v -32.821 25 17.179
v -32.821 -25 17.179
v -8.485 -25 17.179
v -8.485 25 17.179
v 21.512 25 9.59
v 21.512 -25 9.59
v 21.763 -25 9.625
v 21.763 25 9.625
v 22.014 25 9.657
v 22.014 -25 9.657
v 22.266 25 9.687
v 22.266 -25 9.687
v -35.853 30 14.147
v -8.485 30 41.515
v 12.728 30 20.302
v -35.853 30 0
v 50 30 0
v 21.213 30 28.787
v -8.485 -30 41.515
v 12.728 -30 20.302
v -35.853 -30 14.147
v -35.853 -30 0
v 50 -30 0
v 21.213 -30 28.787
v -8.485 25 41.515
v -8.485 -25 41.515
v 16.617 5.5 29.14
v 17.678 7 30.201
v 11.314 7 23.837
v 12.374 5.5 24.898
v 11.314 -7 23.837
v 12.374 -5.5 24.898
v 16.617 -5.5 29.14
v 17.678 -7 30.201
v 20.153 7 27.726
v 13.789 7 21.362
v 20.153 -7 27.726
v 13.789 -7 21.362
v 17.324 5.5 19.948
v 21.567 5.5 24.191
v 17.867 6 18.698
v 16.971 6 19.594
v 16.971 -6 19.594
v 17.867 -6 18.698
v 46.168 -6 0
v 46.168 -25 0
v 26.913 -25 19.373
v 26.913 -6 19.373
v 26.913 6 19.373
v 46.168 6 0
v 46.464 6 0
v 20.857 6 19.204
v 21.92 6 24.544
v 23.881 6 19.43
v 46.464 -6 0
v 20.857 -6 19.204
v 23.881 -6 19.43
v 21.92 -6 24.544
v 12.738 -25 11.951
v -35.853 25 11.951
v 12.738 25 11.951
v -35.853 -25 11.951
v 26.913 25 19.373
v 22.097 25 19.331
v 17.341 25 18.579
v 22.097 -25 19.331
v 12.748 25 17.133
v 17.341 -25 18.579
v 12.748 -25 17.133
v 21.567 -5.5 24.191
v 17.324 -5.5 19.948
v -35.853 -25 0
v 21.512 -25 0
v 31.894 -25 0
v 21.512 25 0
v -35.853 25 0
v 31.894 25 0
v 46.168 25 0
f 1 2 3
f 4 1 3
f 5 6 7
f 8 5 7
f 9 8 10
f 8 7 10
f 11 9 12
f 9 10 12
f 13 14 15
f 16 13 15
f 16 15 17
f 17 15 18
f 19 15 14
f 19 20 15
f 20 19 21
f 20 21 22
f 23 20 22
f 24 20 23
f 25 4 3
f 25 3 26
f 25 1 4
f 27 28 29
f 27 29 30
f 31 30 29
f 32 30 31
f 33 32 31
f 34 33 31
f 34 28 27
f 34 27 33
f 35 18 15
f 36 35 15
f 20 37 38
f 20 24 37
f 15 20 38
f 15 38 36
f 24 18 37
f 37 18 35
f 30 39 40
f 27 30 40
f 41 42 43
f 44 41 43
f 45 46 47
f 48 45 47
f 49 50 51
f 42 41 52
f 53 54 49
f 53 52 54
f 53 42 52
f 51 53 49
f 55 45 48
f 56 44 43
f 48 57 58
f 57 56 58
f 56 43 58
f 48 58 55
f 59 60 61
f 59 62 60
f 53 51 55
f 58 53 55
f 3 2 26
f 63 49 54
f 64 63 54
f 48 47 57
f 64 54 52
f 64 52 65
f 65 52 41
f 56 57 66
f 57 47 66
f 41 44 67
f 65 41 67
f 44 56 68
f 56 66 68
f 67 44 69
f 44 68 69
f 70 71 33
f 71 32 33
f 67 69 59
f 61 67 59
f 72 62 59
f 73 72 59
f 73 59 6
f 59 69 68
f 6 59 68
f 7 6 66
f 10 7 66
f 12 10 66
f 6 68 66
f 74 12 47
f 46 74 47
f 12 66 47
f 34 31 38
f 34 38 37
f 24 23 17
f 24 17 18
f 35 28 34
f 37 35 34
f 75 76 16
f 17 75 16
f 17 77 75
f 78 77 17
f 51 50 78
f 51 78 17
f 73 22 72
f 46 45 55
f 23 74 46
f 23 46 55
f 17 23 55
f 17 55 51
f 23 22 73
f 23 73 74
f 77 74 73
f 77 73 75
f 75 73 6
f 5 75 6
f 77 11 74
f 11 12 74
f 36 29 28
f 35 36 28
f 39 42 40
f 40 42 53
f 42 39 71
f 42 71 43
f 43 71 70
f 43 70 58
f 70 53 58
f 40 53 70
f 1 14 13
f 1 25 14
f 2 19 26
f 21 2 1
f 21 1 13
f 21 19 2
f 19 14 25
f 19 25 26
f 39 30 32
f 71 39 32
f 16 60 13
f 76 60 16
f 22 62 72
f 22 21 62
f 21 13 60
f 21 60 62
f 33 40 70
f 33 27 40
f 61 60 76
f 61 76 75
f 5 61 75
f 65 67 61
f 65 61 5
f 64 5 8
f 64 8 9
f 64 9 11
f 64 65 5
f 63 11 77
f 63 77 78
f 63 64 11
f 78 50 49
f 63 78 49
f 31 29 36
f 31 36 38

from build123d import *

# Parameters (mm, degrees)
F1_DEPTH  = 30
F2_W      = 12
F2_H      = 7
F3_DEPTH  = 38.2116781187
F5_DEPTH  = 25
F6_W      = 60.886583291
F6_H      = 11.9508793578
F7_DEPTH  = 25
F8_W      = 14
F8_H      = 9
F8_W_2    = 11
F8_H_2    = 6
F9_DEPTH  = 3.5
F10_W     = 41.5411135182
F10_H     = 24.3398016319
F11_DEPTH = 25


with BuildPart() as f1:
    # F0 (on Front) → F1 (new body, symmetric)
    with BuildSketch(Plane.XZ):
        Polygon((-8.4852813742, 41.5147186258), (-35.8526408672, 14.1473591328), (-35.8526408672, 0), (50, 0), (21.2132034356, 28.7867965644), (12.7279220614, 20.3015151902), align=None)
    extrude(amount=F1_DEPTH, both=True)

    # F2 (on face) → F3 (cut, through all)
    with BuildSketch(Plane(origin=(-3.7867965644, 0, 3.7867965644), x_dir=(0, -1, 0), z_dir=(-0.7071067812, 0, 0.7071067812))):
        with Locations((0, 29.3553390593)):
            Rectangle(F2_W, F2_H)
    extrude(amount=-F3_DEPTH, mode=Mode.SUBTRACT)

    # F4 (on Front) → F5 (cut, symmetric)
    with BuildSketch(Plane.XZ):
        with BuildLine():
            Line((31.8941702423, 0), (46.1681298912, 0))
            Line((46.1681298912, 0), (26.9125392085, 19.3730033934))
            ThreePointArc((26.9125392085, 19.3730033934), (19.7053909545, 19.0432368727), (12.7481166376, 17.1332457749))
            Line((12.7481166376, 17.1332457749), (12.7279220614, 6.3964259197))
            ThreePointArc((12.7279220614, 6.3964259197), (17.3138400367, 8.572904137), (22.2663749009, 9.6865016967))
            Line((22.2663749009, 9.6865016967), (31.8941702423, 0))
        make_face()
    extrude(amount=F5_DEPTH, both=True, mode=Mode.SUBTRACT)

    # F6 (on Front) → F7 (cut, symmetric)
    with BuildSketch(Plane.XZ):
        with Locations((-8.9317080565, 5.9754396789)):
            Rectangle(F6_W, F6_H)
    extrude(amount=F7_DEPTH, both=True, mode=Mode.SUBTRACT)

    # F8 (on face) → F9 (join, symmetric)
    with BuildSketch(Plane(origin=(-3.7867965644, 0, 3.7867965644), x_dir=(0, -1, 0), z_dir=(-0.7071067812, 0, 0.7071067812))):
        with Locations((0, 29.3553390593)):
            Rectangle(F8_W, F8_H)
        with Locations((0, 29.3553390593)):
            Rectangle(F8_W_2, F8_H_2, mode=Mode.SUBTRACT)
    extrude(amount=F9_DEPTH, both=True)

    # F10 (on Front) → F11 (cut, symmetric)
    with BuildSketch(Plane.XZ):
        with Locations((-29.2559308, 29.3487575836)):
            Rectangle(F10_W, F10_H)
    extrude(amount=F11_DEPTH, both=True, mode=Mode.SUBTRACT)


solid = f1.part
